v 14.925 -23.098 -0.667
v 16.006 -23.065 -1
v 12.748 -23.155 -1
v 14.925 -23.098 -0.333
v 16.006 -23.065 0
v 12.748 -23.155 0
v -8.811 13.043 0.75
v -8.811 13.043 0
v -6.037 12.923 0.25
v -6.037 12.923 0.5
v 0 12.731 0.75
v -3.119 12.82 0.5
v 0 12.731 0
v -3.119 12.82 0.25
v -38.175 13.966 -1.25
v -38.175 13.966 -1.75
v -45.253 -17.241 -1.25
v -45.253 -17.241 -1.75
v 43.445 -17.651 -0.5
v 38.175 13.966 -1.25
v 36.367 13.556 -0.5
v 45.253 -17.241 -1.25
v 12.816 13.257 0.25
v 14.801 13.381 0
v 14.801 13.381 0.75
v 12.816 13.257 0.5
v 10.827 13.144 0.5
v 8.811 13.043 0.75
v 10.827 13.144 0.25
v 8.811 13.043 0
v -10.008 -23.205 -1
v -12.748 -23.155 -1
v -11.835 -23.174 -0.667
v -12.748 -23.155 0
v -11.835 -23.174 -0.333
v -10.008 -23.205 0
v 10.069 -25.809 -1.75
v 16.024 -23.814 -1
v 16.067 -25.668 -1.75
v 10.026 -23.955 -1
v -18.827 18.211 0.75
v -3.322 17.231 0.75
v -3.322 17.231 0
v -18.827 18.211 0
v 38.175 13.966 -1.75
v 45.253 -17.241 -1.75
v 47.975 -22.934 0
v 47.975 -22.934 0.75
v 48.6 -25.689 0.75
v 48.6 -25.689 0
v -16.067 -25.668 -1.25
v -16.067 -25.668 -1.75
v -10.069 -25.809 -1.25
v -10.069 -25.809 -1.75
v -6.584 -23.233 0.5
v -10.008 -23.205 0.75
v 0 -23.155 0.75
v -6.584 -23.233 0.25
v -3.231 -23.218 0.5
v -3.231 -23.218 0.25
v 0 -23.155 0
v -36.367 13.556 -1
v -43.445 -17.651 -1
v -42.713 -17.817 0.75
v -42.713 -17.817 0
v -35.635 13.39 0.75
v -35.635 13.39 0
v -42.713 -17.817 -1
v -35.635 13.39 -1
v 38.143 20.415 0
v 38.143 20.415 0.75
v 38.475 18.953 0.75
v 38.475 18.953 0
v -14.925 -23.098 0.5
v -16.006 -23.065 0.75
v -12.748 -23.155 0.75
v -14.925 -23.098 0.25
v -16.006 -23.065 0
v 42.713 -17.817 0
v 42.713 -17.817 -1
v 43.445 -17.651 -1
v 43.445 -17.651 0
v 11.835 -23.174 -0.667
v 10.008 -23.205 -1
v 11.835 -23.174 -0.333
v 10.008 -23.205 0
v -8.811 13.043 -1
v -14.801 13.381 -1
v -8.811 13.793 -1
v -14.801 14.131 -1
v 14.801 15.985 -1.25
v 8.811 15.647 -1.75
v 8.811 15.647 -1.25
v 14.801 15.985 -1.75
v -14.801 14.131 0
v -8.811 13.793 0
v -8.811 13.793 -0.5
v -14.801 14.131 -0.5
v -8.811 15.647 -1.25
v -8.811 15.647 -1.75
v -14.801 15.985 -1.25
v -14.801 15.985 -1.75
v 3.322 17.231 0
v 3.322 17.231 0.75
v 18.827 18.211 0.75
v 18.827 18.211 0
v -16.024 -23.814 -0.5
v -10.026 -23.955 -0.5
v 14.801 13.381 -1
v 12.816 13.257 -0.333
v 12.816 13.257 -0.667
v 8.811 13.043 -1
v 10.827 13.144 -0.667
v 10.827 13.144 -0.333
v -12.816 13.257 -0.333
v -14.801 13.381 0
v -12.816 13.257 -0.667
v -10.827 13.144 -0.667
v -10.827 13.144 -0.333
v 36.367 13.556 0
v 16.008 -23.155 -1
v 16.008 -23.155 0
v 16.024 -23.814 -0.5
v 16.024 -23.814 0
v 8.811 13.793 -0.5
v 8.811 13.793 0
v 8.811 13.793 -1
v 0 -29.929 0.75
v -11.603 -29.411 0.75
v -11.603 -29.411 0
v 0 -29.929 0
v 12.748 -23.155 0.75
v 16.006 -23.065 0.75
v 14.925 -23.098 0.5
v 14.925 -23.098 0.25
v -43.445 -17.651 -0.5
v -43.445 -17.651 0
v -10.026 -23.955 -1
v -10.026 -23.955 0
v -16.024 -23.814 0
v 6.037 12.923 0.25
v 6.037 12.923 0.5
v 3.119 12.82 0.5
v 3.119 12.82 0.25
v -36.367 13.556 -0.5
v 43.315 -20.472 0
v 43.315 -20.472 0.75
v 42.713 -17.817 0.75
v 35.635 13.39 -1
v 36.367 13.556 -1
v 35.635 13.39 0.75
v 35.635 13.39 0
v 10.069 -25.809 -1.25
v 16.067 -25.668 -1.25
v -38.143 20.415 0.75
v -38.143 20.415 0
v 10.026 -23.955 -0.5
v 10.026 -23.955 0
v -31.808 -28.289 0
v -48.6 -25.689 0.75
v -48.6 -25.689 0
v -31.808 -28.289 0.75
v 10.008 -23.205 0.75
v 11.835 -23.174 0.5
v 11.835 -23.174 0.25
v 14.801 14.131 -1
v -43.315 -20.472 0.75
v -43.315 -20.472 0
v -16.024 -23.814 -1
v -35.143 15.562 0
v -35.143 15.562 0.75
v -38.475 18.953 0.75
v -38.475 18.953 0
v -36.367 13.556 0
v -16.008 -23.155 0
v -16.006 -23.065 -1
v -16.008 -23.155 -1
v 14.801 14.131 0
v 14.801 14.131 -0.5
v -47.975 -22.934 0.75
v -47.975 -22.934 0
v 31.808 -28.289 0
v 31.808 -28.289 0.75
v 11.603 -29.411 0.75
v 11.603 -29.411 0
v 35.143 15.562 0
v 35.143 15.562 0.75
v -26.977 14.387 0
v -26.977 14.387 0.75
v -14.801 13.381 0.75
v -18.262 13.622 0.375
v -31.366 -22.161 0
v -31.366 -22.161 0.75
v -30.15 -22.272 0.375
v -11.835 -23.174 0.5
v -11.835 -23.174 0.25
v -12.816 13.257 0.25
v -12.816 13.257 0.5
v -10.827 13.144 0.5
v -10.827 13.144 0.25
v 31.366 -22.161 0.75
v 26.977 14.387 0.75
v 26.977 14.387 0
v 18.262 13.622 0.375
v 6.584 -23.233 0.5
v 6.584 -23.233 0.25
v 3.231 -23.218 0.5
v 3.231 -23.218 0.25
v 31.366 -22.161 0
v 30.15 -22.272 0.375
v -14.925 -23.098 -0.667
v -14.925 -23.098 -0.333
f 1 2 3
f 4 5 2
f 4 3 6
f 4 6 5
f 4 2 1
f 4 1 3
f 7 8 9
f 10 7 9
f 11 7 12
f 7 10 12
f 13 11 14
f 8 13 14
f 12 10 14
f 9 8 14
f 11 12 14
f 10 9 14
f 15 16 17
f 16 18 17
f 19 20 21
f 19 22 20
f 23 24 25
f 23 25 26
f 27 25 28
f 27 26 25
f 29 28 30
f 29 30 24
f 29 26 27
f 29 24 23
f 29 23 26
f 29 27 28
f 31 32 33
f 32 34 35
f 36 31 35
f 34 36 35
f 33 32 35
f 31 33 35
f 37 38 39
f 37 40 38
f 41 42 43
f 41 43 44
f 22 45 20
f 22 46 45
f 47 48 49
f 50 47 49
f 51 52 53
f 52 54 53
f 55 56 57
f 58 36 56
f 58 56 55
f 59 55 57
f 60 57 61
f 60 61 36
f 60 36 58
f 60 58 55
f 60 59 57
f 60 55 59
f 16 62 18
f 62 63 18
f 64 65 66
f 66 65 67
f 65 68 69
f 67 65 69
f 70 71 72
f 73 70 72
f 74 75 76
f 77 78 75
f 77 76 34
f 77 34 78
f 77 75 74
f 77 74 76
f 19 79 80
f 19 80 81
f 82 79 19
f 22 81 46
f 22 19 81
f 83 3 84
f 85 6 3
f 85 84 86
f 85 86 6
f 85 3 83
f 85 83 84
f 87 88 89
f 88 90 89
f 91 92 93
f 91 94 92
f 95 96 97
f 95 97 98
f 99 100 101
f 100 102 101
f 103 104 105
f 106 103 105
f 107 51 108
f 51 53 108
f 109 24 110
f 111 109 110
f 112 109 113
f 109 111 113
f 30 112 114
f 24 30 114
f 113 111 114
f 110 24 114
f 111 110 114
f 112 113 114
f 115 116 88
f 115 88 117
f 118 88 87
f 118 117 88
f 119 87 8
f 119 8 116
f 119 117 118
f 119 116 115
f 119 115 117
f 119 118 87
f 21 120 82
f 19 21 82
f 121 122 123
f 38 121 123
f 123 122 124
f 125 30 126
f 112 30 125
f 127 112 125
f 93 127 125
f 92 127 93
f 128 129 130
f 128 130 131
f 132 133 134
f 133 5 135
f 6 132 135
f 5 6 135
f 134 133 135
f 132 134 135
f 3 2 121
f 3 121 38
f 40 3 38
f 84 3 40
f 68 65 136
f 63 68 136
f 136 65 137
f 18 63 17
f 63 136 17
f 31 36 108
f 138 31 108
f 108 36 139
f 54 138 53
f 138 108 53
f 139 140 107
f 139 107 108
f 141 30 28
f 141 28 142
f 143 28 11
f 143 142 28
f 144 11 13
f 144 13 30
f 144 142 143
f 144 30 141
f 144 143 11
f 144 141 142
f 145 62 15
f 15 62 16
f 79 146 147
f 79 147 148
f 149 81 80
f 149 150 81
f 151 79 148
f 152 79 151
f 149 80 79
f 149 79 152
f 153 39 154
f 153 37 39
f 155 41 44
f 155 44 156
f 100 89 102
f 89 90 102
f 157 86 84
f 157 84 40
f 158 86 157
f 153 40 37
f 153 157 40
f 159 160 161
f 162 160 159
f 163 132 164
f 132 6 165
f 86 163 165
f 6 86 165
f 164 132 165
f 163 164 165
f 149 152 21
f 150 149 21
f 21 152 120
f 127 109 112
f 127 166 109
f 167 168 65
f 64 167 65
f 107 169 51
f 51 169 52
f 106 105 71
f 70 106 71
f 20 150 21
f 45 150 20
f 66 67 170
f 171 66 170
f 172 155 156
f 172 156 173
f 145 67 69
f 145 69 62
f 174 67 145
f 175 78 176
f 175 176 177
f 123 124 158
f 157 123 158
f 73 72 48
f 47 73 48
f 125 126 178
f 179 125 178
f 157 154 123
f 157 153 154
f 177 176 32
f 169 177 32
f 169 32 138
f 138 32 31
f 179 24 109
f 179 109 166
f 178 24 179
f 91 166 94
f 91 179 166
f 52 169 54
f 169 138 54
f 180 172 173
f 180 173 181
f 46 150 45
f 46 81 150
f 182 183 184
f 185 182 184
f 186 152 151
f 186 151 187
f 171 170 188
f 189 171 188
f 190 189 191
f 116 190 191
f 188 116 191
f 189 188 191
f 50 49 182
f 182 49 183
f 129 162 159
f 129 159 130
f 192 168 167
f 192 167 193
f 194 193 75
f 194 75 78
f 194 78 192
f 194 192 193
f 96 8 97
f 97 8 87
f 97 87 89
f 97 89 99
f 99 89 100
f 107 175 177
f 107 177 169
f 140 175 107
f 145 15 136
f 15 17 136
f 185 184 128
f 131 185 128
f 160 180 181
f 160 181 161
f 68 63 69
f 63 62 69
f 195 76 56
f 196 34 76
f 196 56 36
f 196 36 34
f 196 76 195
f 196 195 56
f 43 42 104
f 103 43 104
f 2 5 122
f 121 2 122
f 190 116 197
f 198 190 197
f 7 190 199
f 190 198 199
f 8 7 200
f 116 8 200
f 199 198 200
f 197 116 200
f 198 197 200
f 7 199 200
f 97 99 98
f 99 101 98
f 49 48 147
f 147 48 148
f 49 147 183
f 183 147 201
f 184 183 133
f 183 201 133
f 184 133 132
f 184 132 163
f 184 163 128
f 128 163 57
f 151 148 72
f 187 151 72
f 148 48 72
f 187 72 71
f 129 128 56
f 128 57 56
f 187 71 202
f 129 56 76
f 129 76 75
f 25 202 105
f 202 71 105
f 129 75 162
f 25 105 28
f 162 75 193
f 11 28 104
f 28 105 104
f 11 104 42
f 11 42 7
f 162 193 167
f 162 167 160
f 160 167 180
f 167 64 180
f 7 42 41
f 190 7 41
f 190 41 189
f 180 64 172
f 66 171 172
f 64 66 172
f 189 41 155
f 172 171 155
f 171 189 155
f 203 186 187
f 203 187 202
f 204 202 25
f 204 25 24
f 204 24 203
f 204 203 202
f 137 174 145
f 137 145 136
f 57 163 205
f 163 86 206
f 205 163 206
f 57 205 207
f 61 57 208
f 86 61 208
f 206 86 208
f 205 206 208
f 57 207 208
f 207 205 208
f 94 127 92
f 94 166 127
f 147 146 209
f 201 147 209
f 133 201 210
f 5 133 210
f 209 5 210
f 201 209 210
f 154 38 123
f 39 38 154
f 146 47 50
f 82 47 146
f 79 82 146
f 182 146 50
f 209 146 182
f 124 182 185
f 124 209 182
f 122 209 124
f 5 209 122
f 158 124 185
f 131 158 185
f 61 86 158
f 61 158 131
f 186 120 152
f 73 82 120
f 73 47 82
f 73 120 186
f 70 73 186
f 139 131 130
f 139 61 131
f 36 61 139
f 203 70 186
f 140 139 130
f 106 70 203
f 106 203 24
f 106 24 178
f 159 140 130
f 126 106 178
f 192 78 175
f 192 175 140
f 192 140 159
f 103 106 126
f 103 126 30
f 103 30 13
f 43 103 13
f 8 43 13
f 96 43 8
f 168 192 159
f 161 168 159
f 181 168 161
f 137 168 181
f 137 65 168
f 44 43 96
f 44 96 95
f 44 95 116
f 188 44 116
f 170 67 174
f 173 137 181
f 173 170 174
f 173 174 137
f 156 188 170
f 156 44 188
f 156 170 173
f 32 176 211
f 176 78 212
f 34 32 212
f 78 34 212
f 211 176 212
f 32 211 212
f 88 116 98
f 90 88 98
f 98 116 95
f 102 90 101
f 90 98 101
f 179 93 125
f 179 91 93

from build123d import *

# Parameters (mm, degrees)
F1_DEPTH = 0.75
F2_DEPTH = 1
F4_DEPTH = 0.75
F6_DEPTH = 0.75
F8_DEPTH = 0.75


with BuildPart() as f1:
    # F0 (on Top) → F1 (new body)
    with BuildSketch(Plane.XY):
        with BuildLine():
            add(Edge.make_bspline(
                [(-37.5, 18.7313321615), (-32.3807911431, 17.926577975), (-18.7011737223, 16.5680764405), (-7.3513992733, 15.9357535011), (0, 15.7313321615)],
                knots=[0, 0, 0, 0, 0.4901565124, 1, 1, 1, 1], degree=3))
            Line((-37.5, 18.7313321615), (-47, -23.1548529118))
            Line((-47, -23.1548529118), (-16.0084403101, -23.1548529118))
            Line((-16.0084403101, -23.1548529118), (-16.0063231241, -23.0646254072))
            add(Edge.make_bspline(
                [(-43.315390494, -20.4723017862), (-38.3905339247, -21.2993483436), (-33.0056838871, -22.2189238519), (-21.2861009313, -22.8925835376), (-16.0063231241, -23.0646254072)],
                knots=[0, 0, 0, 0, 0.398937465, 0.6969379575, 0.6969379575, 0.6969379575, 0.6969379575], degree=3))
            Line((-43.315390494, -20.4723017862), (-42.7131794367, -17.8171098074))
            Line((-42.7131794367, -17.8171098074), (-43.4446029246, -17.651219237))
            Line((-43.4446029246, -17.651219237), (-36.3666052528, 13.5561829132))
            Line((-36.3666052528, 13.5561829132), (-35.635181765, 13.3902923427))
            Line((-35.635181765, 13.3902923427), (-35.1425150574, 15.562495384))
            add(Edge.make_bspline(
                [(-35.1425150574, 15.562495384), (-30.4836686701, 14.6303577349), (-22.7091897663, 13.9291012054), (-15.9390947662, 13.4553124867), (-14.8013141006, 13.3810050341)],
                knots=[0, 0, 0, 0, 0.4908367268, 0.5909725979, 0.5909725979, 0.5909725979, 0.5909725979], degree=3))
            Line((-14.8013141006, 13.3810050341), (-14.8013141006, 14.1310050341))
            Line((-14.8013141006, 14.1310050341), (-8.8108518429, 13.792830613))
            Line((-8.8108518429, 13.792830613), (-8.8108518429, 13.042830613))
            add(Edge.make_bspline(
                [(-8.8108518429, 13.042830613), (-6.0913133604, 12.9141276056), (-3.2370188614, 12.8126642043), (0, 12.7313321615)],
                knots=[0.7661743328, 0.7661743328, 0.7661743328, 0.7661743328, 1, 1, 1, 1], degree=3))
            Line((0, 12.7313321615), (0, 15.7313321615))
        make_face()
        with BuildLine():
            Line((-16.0084403101, -23.1548529118), (-47, -23.1548529118))
            add(Edge.make_bspline(
                [(-47, -23.1548529118), (-39.471310208, -24.0545421828), (-29.2503257197, -25.7571688291), (-8.0323131497, -26.1634826516), (0, -26.1548529118)],
                knots=[0, 0, 0, 0, 0.4528935937, 1, 1, 1, 1], degree=3))
            Line((0, -26.1548529118), (0, -23.1548529118))
            add(Edge.make_bspline(
                [(-10.0079742572, -23.2053765011), (-6.5667353079, -23.2536816802), (-3.1521121944, -23.2431206783), (0, -23.1548529118)],
                knots=[0.8085428965, 0.8085428965, 0.8085428965, 0.8085428965, 1, 1, 1, 1], degree=3))
            Line((-10.0079742572, -23.2053765011), (-10.0255681439, -23.9551701095))
            Line((-10.0255681439, -23.9551701095), (-16.0239170108, -23.8144190156))
            Line((-16.0239170108, -23.8144190156), (-16.0084403101, -23.1548529118))
        make_face()
        with BuildLine():
            Line((-16.0063231241, -23.0646254072), (-16.0084403101, -23.1548529118))
            Line((-16.0084403101, -23.1548529118), (-12.748052928, -23.1548529118))
            add(Edge.make_bspline(
                [(-16.0063231241, -23.0646254072), (-14.9289009553, -23.0997332718), (-13.8402912127, -23.1300103495), (-12.748052928, -23.1548529118)],
                knots=[0.6969379575, 0.6969379575, 0.6969379575, 0.6969379575, 0.7577496714, 0.7577496714, 0.7577496714, 0.7577496714], degree=3))
        make_face()
        with BuildLine():
            Line((-12.748052928, -23.1548529118), (-16.0084403101, -23.1548529118))
            Line((-16.0084403101, -23.1548529118), (-16.0239170108, -23.8144190156))
            Line((-16.0239170108, -23.8144190156), (-10.0255681439, -23.9551701095))
            Line((-10.0255681439, -23.9551701095), (-10.0079742572, -23.2053765011))
            add(Edge.make_bspline(
                [(-12.748052928, -23.1548529118), (-11.8357565687, -23.1756027605), (-10.9209287599, -23.192561224), (-10.0079742572, -23.2053765011)],
                knots=[0.7577496714, 0.7577496714, 0.7577496714, 0.7577496714, 0.8085428965, 0.8085428965, 0.8085428965, 0.8085428965], degree=3))
        make_face()
        with BuildLine():
            add(Edge.make_bspline(
                [(-14.8013141006, 13.3810050341), (-12.8106074305, 13.2509937357), (-10.8485573953, 13.1392656642), (-8.8108518429, 13.042830613)],
                knots=[0.5909725979, 0.5909725979, 0.5909725979, 0.5909725979, 0.7661743328, 0.7661743328, 0.7661743328, 0.7661743328], degree=3))
            Line((-8.8108518429, 13.042830613), (-8.8108518429, 13.792830613))
            Line((-8.8108518429, 13.792830613), (-14.8013141006, 14.1310050341))
            Line((-14.8013141006, 14.1310050341), (-14.8013141006, 13.3810050341))
        make_face()
        Polygon((-43.4446029246, -17.651219237), (-42.7131794367, -17.8171098074), (-35.635181765, 13.3902923427), (-36.3666052528, 13.5561829132), align=None)
    extrude(amount=F1_DEPTH)

    # F0 (on Top) → F2 (join)
    with BuildSketch(Plane.XY):
        with BuildLine():
            Line((-16.0063231241, -23.0646254072), (-16.0084403101, -23.1548529118))
            Line((-16.0084403101, -23.1548529118), (-12.748052928, -23.1548529118))
            add(Edge.make_bspline(
                [(-16.0063231241, -23.0646254072), (-14.9289009553, -23.0997332718), (-13.8402912127, -23.1300103495), (-12.748052928, -23.1548529118)],
                knots=[0.6969379575, 0.6969379575, 0.6969379575, 0.6969379575, 0.7577496714, 0.7577496714, 0.7577496714, 0.7577496714], degree=3))
        make_face()
        with BuildLine():
            Line((-12.748052928, -23.1548529118), (-16.0084403101, -23.1548529118))
            Line((-16.0084403101, -23.1548529118), (-16.0239170108, -23.8144190156))
            Line((-16.0239170108, -23.8144190156), (-10.0255681439, -23.9551701095))
            Line((-10.0255681439, -23.9551701095), (-10.0079742572, -23.2053765011))
            add(Edge.make_bspline(
                [(-12.748052928, -23.1548529118), (-11.8357565687, -23.1756027605), (-10.9209287599, -23.192561224), (-10.0079742572, -23.2053765011)],
                knots=[0.7577496714, 0.7577496714, 0.7577496714, 0.7577496714, 0.8085428965, 0.8085428965, 0.8085428965, 0.8085428965], degree=3))
        make_face()
        with BuildLine():
            add(Edge.make_bspline(
                [(-14.8013141006, 13.3810050341), (-12.8106074305, 13.2509937357), (-10.8485573953, 13.1392656642), (-8.8108518429, 13.042830613)],
                knots=[0.5909725979, 0.5909725979, 0.5909725979, 0.5909725979, 0.7661743328, 0.7661743328, 0.7661743328, 0.7661743328], degree=3))
            Line((-8.8108518429, 13.042830613), (-8.8108518429, 13.792830613))
            Line((-8.8108518429, 13.792830613), (-14.8013141006, 14.1310050341))
            Line((-14.8013141006, 14.1310050341), (-14.8013141006, 13.3810050341))
        make_face()
        Polygon((-43.4446029246, -17.651219237), (-42.7131794367, -17.8171098074), (-35.635181765, 13.3902923427), (-36.3666052528, 13.5561829132), align=None)
    extrude(amount=-F2_DEPTH)

    # F3 (on face) → F4 (join, through all)
    with BuildSketch(Plane.XY.offset(0.75)):
        Polygon((-47.9752313172, -22.9336654846), (-47, -23.1548529118), (-37.5, 18.7313321615), (-38.4752313172, 18.9525195888), align=None)
    extrude(amount=-F4_DEPTH)

    # F5 (on face) → F6 (join, through all)
    with BuildSketch(Plane.XY.offset(0.75)):
        with BuildLine():
            Line((-38.1434501763, 20.4153665646), (-38.4752313172, 18.9525195888))
            Line((-38.4752313172, 18.9525195888), (-37.5, 18.7313321615))
            add(Edge.make_bspline(
                [(-37.5, 18.7313321615), (-32.3807911431, 17.926577975), (-18.7011737223, 16.5680764405), (-7.3513992733, 15.9357535011), (0, 15.7313321615)],
                knots=[0, 0, 0, 0, 0.4901565124, 1, 1, 1, 1], degree=3))
            Line((0, 15.7313321615), (0, 17.2313321615))
            Line((0, 17.2313321615), (-3.3217752352, 17.2313321615))
            Line((-3.3217752352, 17.2313321615), (-18.8273077893, 18.2105369309))
            Line((-18.8273077893, 18.2105369309), (-38.1434501763, 20.4153665646))
        make_face()
    extrude(amount=-F6_DEPTH)

    # F7 (on face) → F8 (join, through all)
    with BuildSketch(Plane.XY.offset(0.75)):
        with BuildLine():
            Line((-47, -23.1548529118), (-47.9752313172, -22.9336654846))
            Line((-47.9752313172, -22.9336654846), (-48.6002014355, -25.6892038047))
            Line((-48.6002014355, -25.6892038047), (-31.8084545434, -28.2887462527))
            Line((-31.8084545434, -28.2887462527), (-11.6026224568, -29.4112917036))
            Line((-11.6026224568, -29.4112917036), (0, -29.9293901771))
            Line((0, -29.9293901771), (0, -26.1548529118))
            add(Edge.make_bspline(
                [(-47, -23.1548529118), (-39.471310208, -24.0545421828), (-29.2503257197, -25.7571688291), (-8.0323131497, -26.1634826516), (0, -26.1548529118)],
                knots=[0, 0, 0, 0, 0.4528935937, 1, 1, 1, 1], degree=3))
        make_face()
    extrude(amount=-F8_DEPTH)

    # F9 (on face) → F11 section 0
    with BuildSketch(Plane.YZ.offset(-8.8108518429)):
        Polygon((13.792830613, -0.5), (13.792830613, -1), (15.6468802348, -1.75), (15.6468802348, -1.25), align=None)
    # F10 (on face) → F11 section 1
    with BuildSketch(Plane(origin=(-14.8013141006, 0, 0), x_dir=(0, -1, 0), z_dir=(-1, 0, 0))):
        Polygon((-15.9850546559, -1.75), (-14.1310050341, -1), (-14.1310050341, -0.5), (-15.9850546559, -1.25), align=None)
    loft()

    # F12 (on face) → F14 section 0
    with BuildSketch(Plane(origin=(-15.4566018313, 0.3626887438, 0), x_dir=(-0.0234585156, -0.9997248112, 0), z_dir=(-0.9997248112, 0.0234585156, 0))):
        Polygon((24.1837628611, -0.5), (24.1837628611, -1), (26.0378124829, -1.75), (26.0378124829, -1.25), align=None)
    # F13 (on face) → F14 section 1
    with BuildSketch(Plane(origin=(-9.4582529644, 0.2219376499, 0), x_dir=(0.0234585156, 0.9997248112, 0), z_dir=(0.9997248112, -0.0234585156, 0))):
        Polygon((-26.0378124829, -1.75), (-24.1837628611, -1), (-24.1837628611, -0.5), (-26.0378124829, -1.25), align=None)
    loft()

    # F15 (on face) → F17 section 0
    with BuildSketch(Plane(origin=(1.1449940284, 5.04836124, 0), x_dir=(-0.9752313172, 0.2211874272, 0), z_dir=(0.2211874272, 0.9752313172, 0))):
        Polygon((38.4643095643, -0.5), (38.4643095643, -1), (40.3183591861, -1.75), (40.3183591861, -1.25), align=None)
    # F16 (on face) → F17 section 1
    with BuildSketch(Plane(origin=(-5.9330036433, -26.1590409101, 0), x_dir=(0.9752313172, -0.2211874272, 0), z_dir=(-0.2211874272, -0.9752313172, 0))):
        Polygon((-40.3183591861, -1.75), (-38.4643095643, -1), (-38.4643095643, -0.5), (-40.3183591861, -1.25), align=None)
    loft()

    # F18: F1 across plane


with BuildPart() as f1_1:
    add(f1.part)
    add(f1.part.mirror(Plane.YZ))


solid = f1_1.part
